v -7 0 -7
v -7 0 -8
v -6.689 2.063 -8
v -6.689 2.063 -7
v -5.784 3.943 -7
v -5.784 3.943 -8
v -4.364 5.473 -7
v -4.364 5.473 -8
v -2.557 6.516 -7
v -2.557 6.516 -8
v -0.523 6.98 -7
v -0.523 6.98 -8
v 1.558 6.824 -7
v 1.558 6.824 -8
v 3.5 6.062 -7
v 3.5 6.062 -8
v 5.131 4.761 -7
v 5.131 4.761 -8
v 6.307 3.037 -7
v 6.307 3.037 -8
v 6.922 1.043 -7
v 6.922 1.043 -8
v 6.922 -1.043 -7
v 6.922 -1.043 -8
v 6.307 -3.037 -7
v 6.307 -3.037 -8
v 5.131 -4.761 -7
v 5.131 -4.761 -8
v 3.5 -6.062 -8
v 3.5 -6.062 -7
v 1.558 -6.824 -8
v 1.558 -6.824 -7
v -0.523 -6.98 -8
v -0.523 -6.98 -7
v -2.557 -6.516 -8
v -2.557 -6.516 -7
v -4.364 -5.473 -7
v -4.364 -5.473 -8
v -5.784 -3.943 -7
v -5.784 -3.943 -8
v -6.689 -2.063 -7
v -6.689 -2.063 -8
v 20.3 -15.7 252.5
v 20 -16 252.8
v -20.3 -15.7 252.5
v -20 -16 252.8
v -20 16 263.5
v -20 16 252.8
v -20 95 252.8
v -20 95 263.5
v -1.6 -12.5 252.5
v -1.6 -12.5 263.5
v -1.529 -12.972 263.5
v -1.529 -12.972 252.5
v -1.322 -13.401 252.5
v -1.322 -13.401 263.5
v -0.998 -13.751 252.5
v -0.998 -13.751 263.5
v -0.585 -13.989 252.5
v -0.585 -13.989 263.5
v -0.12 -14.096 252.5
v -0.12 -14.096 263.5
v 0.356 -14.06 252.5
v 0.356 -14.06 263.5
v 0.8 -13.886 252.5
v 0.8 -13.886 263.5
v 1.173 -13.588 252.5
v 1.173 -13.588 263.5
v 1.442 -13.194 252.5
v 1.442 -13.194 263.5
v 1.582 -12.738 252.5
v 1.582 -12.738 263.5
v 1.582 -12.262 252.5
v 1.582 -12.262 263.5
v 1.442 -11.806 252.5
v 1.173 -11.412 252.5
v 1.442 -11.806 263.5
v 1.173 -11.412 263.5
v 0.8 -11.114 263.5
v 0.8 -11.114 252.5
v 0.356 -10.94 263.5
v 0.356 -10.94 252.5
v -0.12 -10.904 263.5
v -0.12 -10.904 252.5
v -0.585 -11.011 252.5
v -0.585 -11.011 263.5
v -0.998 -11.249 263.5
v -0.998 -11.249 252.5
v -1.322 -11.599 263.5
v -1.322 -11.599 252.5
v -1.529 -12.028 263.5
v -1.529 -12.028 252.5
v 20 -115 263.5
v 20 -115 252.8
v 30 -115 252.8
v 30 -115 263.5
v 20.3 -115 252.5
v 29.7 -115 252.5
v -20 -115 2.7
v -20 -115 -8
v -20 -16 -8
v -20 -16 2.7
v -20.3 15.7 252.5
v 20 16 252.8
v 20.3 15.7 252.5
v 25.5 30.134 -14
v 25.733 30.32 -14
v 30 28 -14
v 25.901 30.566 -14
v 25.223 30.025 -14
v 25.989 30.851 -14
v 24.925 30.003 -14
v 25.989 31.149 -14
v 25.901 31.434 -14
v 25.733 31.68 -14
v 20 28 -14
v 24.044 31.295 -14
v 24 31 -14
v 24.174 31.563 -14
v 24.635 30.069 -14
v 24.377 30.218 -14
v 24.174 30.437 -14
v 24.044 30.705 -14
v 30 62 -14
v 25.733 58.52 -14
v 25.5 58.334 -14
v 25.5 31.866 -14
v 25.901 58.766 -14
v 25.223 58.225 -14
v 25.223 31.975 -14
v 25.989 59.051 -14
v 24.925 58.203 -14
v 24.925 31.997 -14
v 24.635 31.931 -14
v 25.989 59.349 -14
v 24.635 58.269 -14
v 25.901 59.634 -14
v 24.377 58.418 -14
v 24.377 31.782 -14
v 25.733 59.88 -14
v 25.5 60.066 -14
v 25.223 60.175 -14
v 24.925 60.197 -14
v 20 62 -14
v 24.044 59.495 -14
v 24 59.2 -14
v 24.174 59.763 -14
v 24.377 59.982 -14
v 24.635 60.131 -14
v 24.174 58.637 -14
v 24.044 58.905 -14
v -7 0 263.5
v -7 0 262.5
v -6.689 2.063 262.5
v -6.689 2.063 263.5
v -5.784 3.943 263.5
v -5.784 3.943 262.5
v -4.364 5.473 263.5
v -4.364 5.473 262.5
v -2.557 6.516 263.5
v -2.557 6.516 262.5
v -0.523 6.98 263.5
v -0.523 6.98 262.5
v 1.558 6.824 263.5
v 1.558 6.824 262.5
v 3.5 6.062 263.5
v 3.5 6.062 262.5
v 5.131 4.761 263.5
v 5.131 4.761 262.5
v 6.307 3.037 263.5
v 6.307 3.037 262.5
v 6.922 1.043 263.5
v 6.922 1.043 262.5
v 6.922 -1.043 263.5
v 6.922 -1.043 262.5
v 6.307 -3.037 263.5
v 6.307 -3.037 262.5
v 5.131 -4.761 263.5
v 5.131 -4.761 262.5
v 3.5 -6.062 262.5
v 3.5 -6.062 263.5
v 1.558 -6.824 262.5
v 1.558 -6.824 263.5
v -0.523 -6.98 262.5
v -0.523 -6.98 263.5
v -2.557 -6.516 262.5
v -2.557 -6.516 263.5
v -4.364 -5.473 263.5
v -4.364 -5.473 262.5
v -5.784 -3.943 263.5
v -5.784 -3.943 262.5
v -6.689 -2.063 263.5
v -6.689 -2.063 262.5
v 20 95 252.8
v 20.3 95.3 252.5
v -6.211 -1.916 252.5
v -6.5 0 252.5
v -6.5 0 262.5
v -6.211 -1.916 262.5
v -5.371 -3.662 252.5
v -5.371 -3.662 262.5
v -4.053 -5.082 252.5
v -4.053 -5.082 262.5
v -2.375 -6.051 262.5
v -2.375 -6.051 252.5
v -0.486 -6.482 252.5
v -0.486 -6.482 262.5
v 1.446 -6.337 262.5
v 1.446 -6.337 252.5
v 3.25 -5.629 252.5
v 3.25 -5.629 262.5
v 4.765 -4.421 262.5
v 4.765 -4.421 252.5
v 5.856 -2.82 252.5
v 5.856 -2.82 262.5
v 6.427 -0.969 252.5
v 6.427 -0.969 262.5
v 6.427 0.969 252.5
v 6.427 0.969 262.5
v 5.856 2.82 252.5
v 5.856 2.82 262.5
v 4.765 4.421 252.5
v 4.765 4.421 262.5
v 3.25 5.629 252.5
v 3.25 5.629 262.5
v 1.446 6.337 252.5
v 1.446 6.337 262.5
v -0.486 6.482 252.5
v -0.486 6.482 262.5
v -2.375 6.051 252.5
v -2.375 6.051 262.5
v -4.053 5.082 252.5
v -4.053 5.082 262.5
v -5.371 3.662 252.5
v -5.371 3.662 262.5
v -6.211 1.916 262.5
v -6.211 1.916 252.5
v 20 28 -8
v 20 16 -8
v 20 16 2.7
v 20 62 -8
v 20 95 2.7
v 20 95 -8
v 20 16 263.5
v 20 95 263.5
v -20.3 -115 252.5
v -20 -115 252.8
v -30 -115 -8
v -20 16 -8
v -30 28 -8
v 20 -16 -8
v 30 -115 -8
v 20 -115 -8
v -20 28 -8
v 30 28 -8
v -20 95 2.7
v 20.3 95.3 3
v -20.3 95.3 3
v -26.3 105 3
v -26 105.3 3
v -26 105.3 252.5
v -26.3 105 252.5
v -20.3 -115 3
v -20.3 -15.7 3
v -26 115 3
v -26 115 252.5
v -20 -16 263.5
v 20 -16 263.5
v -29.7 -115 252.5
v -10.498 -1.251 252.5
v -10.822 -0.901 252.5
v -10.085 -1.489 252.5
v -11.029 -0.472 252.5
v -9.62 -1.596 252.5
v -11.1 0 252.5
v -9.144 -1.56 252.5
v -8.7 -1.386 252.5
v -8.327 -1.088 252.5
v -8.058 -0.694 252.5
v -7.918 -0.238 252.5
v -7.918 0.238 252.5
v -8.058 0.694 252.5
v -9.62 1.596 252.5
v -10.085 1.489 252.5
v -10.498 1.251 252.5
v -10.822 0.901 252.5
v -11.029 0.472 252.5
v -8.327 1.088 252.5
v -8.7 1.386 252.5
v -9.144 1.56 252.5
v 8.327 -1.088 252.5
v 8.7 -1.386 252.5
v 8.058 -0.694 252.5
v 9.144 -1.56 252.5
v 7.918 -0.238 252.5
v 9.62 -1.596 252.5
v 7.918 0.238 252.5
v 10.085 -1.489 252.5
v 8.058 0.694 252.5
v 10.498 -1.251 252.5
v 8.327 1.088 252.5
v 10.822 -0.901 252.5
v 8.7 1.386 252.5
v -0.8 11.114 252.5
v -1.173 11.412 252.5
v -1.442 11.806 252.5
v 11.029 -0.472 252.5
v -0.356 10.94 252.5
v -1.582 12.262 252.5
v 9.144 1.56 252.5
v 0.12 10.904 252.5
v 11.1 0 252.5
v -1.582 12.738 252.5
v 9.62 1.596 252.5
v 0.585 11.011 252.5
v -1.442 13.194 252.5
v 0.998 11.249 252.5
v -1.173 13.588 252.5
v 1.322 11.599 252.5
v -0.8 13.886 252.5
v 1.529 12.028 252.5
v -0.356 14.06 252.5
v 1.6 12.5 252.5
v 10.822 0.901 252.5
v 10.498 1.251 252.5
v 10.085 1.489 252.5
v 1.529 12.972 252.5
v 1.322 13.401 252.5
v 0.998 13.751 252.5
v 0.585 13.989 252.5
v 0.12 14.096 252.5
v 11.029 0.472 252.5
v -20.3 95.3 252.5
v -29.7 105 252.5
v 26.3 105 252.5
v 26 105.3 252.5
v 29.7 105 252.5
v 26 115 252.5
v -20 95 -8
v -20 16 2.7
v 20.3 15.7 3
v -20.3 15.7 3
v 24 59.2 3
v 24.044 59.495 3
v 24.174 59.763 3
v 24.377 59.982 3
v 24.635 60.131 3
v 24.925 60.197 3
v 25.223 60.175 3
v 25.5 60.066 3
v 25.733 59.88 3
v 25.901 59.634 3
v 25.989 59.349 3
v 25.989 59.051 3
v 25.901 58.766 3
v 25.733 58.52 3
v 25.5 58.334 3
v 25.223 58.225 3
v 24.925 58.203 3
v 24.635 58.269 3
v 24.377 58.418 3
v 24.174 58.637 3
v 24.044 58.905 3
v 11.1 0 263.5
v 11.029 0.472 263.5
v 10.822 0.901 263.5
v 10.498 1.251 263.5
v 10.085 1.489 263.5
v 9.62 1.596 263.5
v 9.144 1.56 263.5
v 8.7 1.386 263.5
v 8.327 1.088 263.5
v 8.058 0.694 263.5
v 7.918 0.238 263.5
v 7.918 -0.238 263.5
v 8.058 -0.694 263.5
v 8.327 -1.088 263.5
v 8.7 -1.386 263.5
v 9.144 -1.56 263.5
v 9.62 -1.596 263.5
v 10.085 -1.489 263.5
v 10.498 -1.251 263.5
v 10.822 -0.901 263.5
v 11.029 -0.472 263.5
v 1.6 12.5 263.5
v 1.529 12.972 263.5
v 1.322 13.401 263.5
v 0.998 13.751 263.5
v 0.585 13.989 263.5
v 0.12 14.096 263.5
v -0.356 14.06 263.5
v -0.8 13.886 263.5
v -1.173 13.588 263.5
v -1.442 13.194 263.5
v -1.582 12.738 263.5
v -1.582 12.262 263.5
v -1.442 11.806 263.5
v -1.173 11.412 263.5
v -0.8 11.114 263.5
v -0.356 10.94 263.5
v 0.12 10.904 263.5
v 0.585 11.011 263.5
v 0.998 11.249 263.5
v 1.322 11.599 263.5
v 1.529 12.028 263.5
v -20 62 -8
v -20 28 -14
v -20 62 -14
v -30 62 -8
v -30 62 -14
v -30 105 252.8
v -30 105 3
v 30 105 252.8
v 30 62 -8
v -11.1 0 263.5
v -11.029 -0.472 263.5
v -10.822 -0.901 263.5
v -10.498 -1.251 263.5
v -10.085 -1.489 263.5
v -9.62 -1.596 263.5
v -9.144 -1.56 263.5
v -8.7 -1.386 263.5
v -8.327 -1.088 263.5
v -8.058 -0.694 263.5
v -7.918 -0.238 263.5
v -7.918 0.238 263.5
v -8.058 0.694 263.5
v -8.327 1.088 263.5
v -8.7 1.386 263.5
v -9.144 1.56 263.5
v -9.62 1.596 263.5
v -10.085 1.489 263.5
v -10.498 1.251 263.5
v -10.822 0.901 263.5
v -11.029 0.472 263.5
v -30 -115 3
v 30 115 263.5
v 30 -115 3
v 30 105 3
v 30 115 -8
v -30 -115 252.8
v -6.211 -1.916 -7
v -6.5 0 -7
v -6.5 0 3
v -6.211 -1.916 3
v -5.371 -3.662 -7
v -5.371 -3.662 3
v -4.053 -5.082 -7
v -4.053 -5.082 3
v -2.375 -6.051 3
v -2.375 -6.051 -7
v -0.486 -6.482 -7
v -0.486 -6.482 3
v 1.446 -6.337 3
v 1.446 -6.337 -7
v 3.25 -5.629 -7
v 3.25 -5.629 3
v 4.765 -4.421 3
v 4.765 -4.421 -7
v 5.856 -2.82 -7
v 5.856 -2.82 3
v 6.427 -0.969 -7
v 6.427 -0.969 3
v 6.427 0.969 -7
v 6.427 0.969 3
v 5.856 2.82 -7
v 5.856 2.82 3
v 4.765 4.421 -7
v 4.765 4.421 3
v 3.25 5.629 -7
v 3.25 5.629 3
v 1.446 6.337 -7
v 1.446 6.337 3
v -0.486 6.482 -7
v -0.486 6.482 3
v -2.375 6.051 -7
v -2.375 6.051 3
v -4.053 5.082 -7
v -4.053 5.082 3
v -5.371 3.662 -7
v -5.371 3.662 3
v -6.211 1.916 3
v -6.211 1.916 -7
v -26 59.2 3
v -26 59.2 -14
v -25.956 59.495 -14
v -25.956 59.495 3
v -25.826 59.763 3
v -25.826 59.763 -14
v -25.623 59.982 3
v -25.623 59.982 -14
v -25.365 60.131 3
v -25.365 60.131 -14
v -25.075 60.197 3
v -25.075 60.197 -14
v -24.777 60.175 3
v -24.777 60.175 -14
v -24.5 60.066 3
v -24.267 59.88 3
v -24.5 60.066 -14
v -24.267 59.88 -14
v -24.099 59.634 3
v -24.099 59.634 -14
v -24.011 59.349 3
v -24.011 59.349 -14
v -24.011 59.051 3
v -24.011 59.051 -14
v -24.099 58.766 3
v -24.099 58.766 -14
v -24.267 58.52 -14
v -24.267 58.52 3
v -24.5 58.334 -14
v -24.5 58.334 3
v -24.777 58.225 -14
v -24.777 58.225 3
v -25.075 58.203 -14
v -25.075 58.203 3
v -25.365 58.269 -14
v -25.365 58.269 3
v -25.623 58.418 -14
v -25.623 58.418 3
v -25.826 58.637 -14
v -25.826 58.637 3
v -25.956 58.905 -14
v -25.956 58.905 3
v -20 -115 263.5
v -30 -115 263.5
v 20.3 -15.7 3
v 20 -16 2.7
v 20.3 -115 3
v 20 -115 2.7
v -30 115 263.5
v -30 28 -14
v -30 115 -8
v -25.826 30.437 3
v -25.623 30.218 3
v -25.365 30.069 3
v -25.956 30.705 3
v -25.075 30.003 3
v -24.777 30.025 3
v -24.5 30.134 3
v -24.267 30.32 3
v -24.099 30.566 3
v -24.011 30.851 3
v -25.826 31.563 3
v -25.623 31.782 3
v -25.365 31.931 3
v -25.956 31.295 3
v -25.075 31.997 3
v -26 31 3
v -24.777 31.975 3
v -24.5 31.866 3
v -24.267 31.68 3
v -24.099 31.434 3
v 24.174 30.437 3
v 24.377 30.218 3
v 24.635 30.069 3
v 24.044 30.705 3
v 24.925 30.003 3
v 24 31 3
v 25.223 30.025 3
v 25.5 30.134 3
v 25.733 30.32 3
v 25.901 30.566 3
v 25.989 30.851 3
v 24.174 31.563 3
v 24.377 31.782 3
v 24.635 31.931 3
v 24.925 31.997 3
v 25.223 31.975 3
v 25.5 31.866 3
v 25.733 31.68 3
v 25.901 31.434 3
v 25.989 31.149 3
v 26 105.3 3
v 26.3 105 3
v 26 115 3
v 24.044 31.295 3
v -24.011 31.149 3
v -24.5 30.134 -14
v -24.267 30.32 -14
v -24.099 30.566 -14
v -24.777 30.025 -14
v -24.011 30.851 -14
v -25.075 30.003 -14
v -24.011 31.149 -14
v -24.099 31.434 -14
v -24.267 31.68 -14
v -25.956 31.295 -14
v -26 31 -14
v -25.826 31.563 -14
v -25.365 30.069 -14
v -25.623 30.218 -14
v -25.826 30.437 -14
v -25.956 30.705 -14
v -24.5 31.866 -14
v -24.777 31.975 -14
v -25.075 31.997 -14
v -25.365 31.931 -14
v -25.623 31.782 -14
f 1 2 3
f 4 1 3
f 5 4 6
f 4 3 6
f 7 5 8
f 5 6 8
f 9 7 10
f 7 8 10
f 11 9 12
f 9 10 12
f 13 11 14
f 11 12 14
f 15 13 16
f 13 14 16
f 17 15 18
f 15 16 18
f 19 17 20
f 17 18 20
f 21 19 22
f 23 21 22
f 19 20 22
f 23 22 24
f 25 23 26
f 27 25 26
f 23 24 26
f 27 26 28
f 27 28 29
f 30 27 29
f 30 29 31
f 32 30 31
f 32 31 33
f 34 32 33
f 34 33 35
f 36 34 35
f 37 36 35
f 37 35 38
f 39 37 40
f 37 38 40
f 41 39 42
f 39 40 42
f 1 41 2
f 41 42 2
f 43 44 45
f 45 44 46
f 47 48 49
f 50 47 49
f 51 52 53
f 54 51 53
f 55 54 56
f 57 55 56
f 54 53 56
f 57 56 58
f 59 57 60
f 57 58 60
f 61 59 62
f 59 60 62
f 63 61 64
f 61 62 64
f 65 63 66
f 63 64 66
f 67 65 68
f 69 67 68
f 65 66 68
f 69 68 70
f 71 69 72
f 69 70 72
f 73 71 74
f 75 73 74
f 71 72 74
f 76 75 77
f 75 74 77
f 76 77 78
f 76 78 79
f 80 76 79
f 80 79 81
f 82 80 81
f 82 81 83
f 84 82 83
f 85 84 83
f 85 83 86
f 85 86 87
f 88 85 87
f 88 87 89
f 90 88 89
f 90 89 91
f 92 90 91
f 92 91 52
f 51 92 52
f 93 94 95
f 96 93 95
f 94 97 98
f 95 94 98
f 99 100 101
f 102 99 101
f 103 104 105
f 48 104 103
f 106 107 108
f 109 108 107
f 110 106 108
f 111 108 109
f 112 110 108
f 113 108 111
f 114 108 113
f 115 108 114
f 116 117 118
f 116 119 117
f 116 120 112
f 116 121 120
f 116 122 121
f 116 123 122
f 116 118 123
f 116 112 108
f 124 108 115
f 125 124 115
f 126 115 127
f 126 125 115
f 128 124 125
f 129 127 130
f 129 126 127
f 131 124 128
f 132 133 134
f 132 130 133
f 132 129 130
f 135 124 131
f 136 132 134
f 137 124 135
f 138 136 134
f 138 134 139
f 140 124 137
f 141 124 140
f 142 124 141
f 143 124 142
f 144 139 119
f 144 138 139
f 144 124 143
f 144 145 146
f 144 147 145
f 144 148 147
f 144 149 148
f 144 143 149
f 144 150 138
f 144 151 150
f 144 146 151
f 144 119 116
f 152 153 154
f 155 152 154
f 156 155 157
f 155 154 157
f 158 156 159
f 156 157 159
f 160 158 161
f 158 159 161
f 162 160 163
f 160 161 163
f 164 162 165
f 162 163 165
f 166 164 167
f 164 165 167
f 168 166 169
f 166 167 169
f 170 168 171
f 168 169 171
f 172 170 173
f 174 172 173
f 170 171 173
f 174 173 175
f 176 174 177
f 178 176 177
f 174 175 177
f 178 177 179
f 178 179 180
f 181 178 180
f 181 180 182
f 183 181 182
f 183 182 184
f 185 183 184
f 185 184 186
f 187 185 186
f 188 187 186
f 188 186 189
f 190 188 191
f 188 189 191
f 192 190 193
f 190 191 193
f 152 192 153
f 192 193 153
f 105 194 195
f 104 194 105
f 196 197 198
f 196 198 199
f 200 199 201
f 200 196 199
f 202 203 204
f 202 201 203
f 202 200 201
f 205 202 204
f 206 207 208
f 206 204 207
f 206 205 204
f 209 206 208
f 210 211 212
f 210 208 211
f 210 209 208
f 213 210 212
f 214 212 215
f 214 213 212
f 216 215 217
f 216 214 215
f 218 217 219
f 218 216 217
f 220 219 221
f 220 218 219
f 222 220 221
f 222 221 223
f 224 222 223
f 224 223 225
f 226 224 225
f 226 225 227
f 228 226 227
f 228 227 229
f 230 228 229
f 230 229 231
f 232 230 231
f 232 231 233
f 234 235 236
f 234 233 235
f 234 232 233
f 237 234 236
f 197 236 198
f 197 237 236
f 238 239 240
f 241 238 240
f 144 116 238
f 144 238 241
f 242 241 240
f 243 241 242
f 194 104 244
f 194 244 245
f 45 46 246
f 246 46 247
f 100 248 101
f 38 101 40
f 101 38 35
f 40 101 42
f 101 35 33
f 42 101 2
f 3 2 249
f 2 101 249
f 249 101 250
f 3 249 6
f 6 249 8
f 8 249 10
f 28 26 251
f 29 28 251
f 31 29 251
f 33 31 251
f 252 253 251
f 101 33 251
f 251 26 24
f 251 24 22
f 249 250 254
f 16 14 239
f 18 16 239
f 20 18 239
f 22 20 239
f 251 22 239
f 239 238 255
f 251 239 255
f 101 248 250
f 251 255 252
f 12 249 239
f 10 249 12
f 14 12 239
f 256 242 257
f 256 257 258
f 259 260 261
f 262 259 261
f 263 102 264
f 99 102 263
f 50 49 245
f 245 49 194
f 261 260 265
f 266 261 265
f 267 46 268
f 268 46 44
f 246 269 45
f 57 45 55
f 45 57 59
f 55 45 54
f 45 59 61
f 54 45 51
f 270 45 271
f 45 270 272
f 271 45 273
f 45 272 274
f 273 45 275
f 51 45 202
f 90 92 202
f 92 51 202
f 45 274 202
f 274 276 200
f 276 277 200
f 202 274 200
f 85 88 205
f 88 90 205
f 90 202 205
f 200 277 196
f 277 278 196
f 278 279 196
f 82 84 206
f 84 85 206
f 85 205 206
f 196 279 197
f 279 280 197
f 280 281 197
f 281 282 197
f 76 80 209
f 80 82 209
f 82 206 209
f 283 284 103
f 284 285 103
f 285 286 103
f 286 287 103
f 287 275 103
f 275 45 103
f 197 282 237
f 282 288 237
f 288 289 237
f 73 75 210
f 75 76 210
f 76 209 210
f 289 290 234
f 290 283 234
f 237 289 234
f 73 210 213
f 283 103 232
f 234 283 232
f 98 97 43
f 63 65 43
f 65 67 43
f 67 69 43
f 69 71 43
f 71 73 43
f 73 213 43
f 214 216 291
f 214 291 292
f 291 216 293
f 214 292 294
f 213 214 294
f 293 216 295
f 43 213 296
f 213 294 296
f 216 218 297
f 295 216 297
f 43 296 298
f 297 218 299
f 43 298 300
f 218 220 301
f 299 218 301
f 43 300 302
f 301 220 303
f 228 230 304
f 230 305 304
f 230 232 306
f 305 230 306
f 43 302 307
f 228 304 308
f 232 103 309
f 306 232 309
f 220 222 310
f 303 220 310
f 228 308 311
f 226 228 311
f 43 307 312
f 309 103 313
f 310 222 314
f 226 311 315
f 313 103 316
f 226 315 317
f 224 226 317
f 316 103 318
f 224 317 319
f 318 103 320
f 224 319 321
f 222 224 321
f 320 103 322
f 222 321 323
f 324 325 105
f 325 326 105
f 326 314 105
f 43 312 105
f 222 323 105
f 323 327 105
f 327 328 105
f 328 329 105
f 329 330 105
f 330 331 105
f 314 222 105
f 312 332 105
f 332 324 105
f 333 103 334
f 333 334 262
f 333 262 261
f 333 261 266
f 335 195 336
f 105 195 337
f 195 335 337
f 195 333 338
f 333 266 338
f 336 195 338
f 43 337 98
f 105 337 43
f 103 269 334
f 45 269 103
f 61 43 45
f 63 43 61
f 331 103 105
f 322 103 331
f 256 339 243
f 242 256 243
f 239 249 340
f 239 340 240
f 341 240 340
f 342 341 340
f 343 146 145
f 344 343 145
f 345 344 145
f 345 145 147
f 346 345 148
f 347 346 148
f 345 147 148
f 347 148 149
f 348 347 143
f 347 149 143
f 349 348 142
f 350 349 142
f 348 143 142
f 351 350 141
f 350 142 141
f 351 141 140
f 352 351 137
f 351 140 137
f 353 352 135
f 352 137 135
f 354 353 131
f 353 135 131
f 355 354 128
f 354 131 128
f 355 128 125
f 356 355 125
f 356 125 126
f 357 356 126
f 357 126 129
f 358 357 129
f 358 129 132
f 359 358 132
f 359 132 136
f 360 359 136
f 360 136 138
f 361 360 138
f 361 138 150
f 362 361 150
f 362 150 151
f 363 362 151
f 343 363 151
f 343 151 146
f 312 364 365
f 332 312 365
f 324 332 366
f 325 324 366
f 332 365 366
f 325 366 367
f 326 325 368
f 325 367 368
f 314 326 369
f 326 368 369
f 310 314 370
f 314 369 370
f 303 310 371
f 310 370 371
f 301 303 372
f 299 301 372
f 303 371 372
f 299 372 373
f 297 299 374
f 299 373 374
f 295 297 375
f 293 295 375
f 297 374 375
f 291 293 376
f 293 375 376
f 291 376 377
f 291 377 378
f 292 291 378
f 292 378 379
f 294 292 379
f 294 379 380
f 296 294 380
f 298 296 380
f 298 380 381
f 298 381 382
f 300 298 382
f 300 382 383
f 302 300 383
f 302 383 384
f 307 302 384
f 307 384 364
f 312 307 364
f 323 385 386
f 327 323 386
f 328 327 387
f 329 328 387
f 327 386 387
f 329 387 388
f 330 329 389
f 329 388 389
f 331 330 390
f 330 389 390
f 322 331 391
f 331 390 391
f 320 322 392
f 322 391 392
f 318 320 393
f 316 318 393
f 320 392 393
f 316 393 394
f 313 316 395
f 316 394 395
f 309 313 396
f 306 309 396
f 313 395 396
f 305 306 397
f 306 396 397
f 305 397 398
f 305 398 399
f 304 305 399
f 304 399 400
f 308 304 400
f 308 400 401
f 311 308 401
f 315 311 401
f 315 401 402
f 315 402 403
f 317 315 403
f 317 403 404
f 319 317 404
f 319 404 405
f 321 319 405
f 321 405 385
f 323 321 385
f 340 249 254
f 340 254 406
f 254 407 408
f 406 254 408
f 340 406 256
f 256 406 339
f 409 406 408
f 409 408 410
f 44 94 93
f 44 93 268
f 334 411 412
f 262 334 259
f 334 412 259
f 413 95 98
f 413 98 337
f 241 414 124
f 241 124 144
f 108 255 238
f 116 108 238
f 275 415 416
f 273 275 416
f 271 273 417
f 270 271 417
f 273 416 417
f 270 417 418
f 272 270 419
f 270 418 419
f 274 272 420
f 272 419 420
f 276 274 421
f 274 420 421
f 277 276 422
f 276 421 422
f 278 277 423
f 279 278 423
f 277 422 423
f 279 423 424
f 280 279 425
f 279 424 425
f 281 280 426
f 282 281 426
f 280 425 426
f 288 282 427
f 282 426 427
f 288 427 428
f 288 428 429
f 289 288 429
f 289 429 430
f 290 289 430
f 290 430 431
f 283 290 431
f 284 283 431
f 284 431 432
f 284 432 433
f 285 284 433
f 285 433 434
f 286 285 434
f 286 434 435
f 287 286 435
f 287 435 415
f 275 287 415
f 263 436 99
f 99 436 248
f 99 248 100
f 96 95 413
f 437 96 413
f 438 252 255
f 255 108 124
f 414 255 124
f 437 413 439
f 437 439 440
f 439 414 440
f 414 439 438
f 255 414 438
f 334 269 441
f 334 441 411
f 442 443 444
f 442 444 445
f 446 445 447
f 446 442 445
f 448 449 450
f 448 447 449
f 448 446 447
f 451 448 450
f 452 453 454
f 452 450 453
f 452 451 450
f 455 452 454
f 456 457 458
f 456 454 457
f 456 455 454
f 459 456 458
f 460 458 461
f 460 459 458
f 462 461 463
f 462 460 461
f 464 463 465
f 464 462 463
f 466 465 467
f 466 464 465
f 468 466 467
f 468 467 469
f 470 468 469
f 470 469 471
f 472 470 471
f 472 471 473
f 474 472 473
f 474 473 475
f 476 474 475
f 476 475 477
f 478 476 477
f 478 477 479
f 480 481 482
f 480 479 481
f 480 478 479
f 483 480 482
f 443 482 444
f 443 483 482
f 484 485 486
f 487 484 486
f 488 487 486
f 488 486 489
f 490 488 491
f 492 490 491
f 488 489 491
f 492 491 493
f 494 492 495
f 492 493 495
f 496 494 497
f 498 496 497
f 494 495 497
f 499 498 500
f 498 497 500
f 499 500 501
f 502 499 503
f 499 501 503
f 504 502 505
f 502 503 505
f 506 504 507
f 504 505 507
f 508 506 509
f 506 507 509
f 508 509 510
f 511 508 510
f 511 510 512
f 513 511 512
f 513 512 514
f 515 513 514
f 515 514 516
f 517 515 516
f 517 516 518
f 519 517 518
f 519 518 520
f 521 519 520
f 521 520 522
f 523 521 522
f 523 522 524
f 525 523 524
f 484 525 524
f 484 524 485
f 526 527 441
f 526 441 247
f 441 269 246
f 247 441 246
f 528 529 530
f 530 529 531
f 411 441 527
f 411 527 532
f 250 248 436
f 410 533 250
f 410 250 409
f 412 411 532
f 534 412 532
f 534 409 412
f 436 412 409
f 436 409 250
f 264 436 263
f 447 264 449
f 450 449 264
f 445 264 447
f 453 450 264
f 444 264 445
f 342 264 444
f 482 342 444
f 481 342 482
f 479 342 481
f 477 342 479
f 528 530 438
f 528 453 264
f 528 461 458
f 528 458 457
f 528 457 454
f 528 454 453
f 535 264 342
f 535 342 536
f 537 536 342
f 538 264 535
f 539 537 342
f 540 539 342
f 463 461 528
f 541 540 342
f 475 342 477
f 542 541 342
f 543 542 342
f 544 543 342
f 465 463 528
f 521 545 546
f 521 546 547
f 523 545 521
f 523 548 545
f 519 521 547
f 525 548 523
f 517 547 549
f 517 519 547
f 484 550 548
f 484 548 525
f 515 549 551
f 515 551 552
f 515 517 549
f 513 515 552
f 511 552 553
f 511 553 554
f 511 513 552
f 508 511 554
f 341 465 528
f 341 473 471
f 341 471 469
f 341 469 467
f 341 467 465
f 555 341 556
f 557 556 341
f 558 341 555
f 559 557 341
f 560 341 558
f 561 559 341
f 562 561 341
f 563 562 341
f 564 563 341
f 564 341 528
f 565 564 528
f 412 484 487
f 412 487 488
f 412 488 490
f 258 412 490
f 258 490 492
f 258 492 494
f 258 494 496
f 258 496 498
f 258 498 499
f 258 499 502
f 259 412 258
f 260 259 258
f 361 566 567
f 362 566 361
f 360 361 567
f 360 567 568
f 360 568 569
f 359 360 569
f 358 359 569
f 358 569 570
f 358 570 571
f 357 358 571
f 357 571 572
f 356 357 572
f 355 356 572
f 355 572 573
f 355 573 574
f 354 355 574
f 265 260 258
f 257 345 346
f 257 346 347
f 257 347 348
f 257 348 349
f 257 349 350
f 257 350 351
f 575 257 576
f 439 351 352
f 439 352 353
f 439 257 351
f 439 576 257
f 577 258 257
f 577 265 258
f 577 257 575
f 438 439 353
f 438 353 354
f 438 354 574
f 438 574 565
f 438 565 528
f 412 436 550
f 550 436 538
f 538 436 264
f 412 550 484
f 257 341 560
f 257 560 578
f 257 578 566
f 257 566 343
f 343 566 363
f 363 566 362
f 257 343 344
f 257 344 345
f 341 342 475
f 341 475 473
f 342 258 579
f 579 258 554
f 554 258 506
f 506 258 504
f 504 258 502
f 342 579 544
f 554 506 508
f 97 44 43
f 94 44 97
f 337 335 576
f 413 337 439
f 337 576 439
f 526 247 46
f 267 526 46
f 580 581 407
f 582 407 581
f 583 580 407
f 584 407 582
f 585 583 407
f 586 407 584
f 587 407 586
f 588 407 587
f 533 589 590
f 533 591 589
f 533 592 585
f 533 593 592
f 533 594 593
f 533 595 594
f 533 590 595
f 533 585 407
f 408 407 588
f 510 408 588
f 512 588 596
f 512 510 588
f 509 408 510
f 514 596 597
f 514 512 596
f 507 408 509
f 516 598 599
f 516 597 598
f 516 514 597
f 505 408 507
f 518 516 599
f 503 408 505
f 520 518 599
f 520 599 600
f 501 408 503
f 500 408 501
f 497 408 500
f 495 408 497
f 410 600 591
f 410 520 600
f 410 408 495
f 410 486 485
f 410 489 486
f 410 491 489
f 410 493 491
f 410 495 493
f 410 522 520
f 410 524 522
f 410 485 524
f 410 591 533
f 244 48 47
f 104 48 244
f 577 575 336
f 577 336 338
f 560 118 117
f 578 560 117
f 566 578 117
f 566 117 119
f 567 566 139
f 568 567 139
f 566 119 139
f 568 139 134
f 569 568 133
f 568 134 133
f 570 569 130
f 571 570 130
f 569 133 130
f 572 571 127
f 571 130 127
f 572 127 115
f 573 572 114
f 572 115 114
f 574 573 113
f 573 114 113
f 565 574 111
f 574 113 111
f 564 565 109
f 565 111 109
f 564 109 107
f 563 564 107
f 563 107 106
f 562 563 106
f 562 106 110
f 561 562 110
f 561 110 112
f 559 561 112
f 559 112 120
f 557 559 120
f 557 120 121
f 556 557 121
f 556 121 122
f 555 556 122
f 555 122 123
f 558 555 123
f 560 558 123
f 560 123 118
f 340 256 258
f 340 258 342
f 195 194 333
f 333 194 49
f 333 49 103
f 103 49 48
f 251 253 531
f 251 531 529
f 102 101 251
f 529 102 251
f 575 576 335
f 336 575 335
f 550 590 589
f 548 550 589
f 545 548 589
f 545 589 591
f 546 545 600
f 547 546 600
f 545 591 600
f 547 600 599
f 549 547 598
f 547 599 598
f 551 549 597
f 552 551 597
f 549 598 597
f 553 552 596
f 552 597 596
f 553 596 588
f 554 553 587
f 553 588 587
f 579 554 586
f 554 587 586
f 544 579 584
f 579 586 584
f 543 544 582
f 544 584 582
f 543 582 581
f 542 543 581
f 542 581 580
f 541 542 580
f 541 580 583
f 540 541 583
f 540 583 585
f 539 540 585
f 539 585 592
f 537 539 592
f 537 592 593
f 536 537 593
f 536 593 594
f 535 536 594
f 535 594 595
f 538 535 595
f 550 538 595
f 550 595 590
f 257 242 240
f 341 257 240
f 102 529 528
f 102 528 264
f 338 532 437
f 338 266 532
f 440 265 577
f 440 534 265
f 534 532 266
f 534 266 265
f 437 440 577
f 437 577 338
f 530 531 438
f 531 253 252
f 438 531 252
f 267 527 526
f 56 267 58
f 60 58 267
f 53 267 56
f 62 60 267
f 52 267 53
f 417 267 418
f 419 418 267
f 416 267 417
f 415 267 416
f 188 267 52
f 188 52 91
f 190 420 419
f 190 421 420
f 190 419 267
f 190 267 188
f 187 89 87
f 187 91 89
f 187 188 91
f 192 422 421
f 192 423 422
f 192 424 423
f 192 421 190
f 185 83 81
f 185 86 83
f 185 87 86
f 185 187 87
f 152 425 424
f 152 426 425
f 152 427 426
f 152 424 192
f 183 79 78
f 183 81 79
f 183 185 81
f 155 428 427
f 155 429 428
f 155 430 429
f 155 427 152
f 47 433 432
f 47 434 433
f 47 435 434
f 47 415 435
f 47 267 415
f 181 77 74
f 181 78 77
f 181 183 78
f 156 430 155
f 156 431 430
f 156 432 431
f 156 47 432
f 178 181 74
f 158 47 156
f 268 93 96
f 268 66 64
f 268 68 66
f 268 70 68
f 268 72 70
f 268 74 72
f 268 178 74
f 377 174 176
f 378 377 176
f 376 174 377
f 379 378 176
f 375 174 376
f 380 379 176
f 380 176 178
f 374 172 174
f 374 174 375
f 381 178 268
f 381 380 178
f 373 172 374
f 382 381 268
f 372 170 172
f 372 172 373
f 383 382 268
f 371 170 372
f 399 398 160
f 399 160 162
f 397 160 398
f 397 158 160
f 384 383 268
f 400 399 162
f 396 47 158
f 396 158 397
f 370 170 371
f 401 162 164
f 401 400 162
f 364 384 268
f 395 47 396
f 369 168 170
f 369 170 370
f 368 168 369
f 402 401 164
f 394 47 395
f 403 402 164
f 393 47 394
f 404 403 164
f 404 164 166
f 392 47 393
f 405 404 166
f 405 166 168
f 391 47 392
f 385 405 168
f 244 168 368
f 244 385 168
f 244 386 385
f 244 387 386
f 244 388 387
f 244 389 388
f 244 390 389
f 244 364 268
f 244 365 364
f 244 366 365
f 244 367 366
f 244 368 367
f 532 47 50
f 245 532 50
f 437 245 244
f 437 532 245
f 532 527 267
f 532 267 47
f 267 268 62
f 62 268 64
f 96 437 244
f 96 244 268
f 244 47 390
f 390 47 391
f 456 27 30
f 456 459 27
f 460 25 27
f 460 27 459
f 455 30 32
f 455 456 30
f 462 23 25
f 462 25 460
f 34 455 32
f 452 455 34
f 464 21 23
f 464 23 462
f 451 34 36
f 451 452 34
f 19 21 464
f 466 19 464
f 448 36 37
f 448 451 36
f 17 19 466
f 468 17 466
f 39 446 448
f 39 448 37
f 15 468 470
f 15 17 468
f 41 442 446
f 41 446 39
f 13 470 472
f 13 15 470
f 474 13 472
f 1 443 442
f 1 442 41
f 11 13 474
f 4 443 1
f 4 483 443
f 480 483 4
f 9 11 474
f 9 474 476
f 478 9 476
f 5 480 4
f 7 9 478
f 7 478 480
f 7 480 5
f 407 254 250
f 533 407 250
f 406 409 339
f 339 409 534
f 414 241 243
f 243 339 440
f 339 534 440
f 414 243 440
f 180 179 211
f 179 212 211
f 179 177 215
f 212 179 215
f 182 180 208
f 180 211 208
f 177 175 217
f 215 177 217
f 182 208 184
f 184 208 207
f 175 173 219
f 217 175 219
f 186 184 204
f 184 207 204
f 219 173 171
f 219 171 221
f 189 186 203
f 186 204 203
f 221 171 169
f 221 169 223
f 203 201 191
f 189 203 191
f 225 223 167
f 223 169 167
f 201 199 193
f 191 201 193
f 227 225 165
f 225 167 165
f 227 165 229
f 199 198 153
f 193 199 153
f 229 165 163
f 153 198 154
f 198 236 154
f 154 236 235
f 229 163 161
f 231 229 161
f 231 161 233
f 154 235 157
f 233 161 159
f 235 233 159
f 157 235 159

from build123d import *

# Parameters (mm, degrees)
BOSS_EXTRUDE1_START      = -8
SKETCH1_W                = 60
SKETCH1_H                = 230
BOSS_EXTRUDE1_DEPTH      = 11
CUT_EXTRUDE1_DEPTH       = 120.117588961
CUT_EXTRUDE1_DEPTH_BACK  = 120.117588961
SKETCH2_W                = 40
SKETCH2_H                = 99
CUT_EXTRUDE2_DEPTH       = 120.117588961
CUT_EXTRUDE2_DEPTH_BACK  = 120.117588961
SKETCH3_W                = 40
SKETCH3_H                = 79
SKETCH4_W                = 60
SKETCH4_H                = 230
BOSS_EXTRUDE3_DEPTH      = 11
CUT_EXTRUDE3_DEPTH       = 297.373497466
CUT_EXTRUDE3_DEPTH_BACK  = 297.373497466
SKETCH6_W                = 40
SKETCH6_H                = 79
CUT_EXTRUDE4_DEPTH       = 287.33066549
CUT_EXTRUDE4_DEPTH_BACK  = 287.33066549
SKETCH7_W                = 40
SKETCH7_H                = 99
SKETCH8_W                = 4
SKETCH8_H                = 10
BOSS_EXTRUDE4_DEPTH      = 249.5
CUT_EXTRUDE13_DEPTH      = 287.33066549
CUT_EXTRUDE13_DEPTH_BACK = 287.33066549
SKETCH9_R                = 6.5
CUT_EXTRUDE15_START      = -10
SKETCH13_R               = 7
CUT_EXTRUDE15_DEPTH      = 1
SKETCH14_R               = 7
CUT_EXTRUDE16_DEPTH      = 1
CUT_EXTRUDE17_REACH      = 298.373
SKETCH15_R               = 1.6
SKETCH17_W               = 10
SKETCH17_H               = 34
BOSS_EXTRUDE5_DEPTH      = 6
CUT_EXTRUDE18_REACH      = 303.88
SKETCH18_R               = 1
CHAMFER1_SIZE            = 0.3
CHAMFER2_SIZE            = 0.3
CHAMFER3_SIZE            = 0.3
CHAMFER4_SIZE            = 0.3
CHAMFER5_SIZE            = 0.3


with BuildPart() as part:
    # Sketch1 → Boss-Extrude1 (new body)
    with BuildSketch(Plane.XY.offset(BOSS_EXTRUDE1_START)):
        Rectangle(SKETCH1_W, SKETCH1_H)
    extrude(amount=BOSS_EXTRUDE1_DEPTH)

    # Sketch2 → Cut-Extrude1 (cut, two sides: drawn at the far end of the back side and taken through both)
    with BuildSketch(Plane.XY.offset(-CUT_EXTRUDE1_DEPTH_BACK)):
        with Locations((0, -65.5)):
            Rectangle(SKETCH2_W, SKETCH2_H)
    extrude(amount=CUT_EXTRUDE1_DEPTH + CUT_EXTRUDE1_DEPTH_BACK, mode=Mode.SUBTRACT)

    # Sketch3 → Cut-Extrude2 (cut, two sides: drawn at the far end of the back side and taken through both)
    with BuildSketch(Plane.XY.offset(-CUT_EXTRUDE2_DEPTH_BACK)):
        with Locations((0, 55.5)):
            Rectangle(SKETCH3_W, SKETCH3_H)
    extrude(amount=CUT_EXTRUDE2_DEPTH + CUT_EXTRUDE2_DEPTH_BACK, mode=Mode.SUBTRACT)



with BuildPart() as body_2:
    # Sketch4 → Boss-Extrude3 (new body)
    with BuildSketch(Plane.XY.offset(252.5)):
        Rectangle(SKETCH4_W, SKETCH4_H)
    extrude(amount=BOSS_EXTRUDE3_DEPTH)

    # Sketch6 → Cut-Extrude3 (cut, two sides: drawn at the far end of the back side and taken through both)
    with BuildSketch(Plane.XY.offset(263.5).offset(-CUT_EXTRUDE3_DEPTH_BACK)):
        with Locations((0, 55.5)):
            Rectangle(SKETCH6_W, SKETCH6_H)
    extrude(amount=CUT_EXTRUDE3_DEPTH + CUT_EXTRUDE3_DEPTH_BACK, mode=Mode.SUBTRACT)

    # Sketch7 → Cut-Extrude4 (cut, two sides: drawn at the far end of the back side and taken through both)
    with BuildSketch(Plane.XY.offset(252.5).offset(-CUT_EXTRUDE4_DEPTH_BACK)):
        with Locations((0, -65.5)):
            Rectangle(SKETCH7_W, SKETCH7_H)
    extrude(amount=CUT_EXTRUDE4_DEPTH + CUT_EXTRUDE4_DEPTH_BACK, mode=Mode.SUBTRACT)


with BuildPart() as part_1:
    add(part.part)

    add(body_2.part)  # Boss-Extrude4 merges body 2
    # Sketch8 → Boss-Extrude4 (add)
    with BuildSketch(Plane.XY.offset(3)):
        with Locations((-28, 110)):
            Rectangle(SKETCH8_W, SKETCH8_H)
        with Locations((28, 110)):
            Rectangle(SKETCH8_W, SKETCH8_H)
    extrude(amount=BOSS_EXTRUDE4_DEPTH)

    # Sketch9 → Cut-Extrude13 (cut, two sides: drawn at the far end of the back side and taken through both)
    with BuildSketch(Plane.XY.offset(252.5).offset(-CUT_EXTRUDE13_DEPTH_BACK)):
        with Locations(Location((0, 0, 0), (0, 0, 180))):
            Circle(SKETCH9_R)
    extrude(amount=CUT_EXTRUDE13_DEPTH + CUT_EXTRUDE13_DEPTH_BACK, mode=Mode.SUBTRACT)

    # Sketch13 → Cut-Extrude15 (cut)
    with BuildSketch(Plane(origin=(0, 0, 252.5), x_dir=(-1, 0, 0), z_dir=(0, 0, -1)).offset(CUT_EXTRUDE15_START)):
        Circle(SKETCH13_R)
    extrude(amount=-CUT_EXTRUDE15_DEPTH, mode=Mode.SUBTRACT)

    # Sketch14 → Cut-Extrude16 (cut)
    with BuildSketch(Plane(origin=(0, 0, -8), x_dir=(-1, 0, 0), z_dir=(0, 0, -1))):
        Circle(SKETCH14_R)
    extrude(amount=-CUT_EXTRUDE16_DEPTH, mode=Mode.SUBTRACT)

    # Sketch15 → Cut-Extrude17 (cut, up to next)
    with BuildSketch(Plane.XY.offset(263.5), mode=Mode.PRIVATE) as cut_extrude17_sk1:
        with Locations((9.5, 0)):
            Circle(SKETCH15_R)
    cut_extrude17_tool1 = extrude(cut_extrude17_sk1.sketch, amount=-CUT_EXTRUDE17_REACH, mode=Mode.PRIVATE) & part_1.part
    # Sketch15 → Cut-Extrude17 (cut, up to next)
    with BuildSketch(Plane.XY.offset(263.5), mode=Mode.PRIVATE) as cut_extrude17_sk2:
        with Locations(Location((-9.5, 0, 0), (0, 0, 180))):
            Circle(SKETCH15_R)
    cut_extrude17_tool2 = extrude(cut_extrude17_sk2.sketch, amount=-CUT_EXTRUDE17_REACH, mode=Mode.PRIVATE) & part_1.part
    # Sketch15 → Cut-Extrude17 (cut, up to next)
    with BuildSketch(Plane.XY.offset(263.5), mode=Mode.PRIVATE) as cut_extrude17_sk3:
        with Locations((0, 12.5)):
            Circle(SKETCH15_R)
    cut_extrude17_tool3 = extrude(cut_extrude17_sk3.sketch, amount=-CUT_EXTRUDE17_REACH, mode=Mode.PRIVATE) & part_1.part
    # Sketch15 → Cut-Extrude17 (cut, up to next)
    with BuildSketch(Plane.XY.offset(263.5), mode=Mode.PRIVATE) as cut_extrude17_sk4:
        with Locations(Location((0, -12.5, 0), (0, 0, 180))):
            Circle(SKETCH15_R)
    cut_extrude17_tool4 = extrude(cut_extrude17_sk4.sketch, amount=-CUT_EXTRUDE17_REACH, mode=Mode.PRIVATE) & part_1.part
    add(cut_extrude17_tool1.solids().sort_by_distance((9.5, 0, 263.5))[0], mode=Mode.SUBTRACT)
    add(cut_extrude17_tool2.solids().sort_by_distance((-9.5, 0, 263.5))[0], mode=Mode.SUBTRACT)
    add(cut_extrude17_tool3.solids().sort_by_distance((0, 12.5, 263.5))[0], mode=Mode.SUBTRACT)
    add(cut_extrude17_tool4.solids().sort_by_distance((0, -12.5, 263.5))[0], mode=Mode.SUBTRACT)

    # Sketch17 → Boss-Extrude5 (add)
    with BuildSketch(Plane(origin=(0, 0, -8), x_dir=(-1, 0, 0), z_dir=(0, 0, -1))):
        with Locations((25, 45)):
            Rectangle(SKETCH17_W, SKETCH17_H)
        with Locations((-25, 45)):
            Rectangle(SKETCH17_W, SKETCH17_H)
    extrude(amount=BOSS_EXTRUDE5_DEPTH)

    # Sketch18 → Cut-Extrude18 (cut, up to next)
    with BuildSketch(Plane(origin=(0, 0, -14), x_dir=(-1, 0, 0), z_dir=(0, 0, -1)), mode=Mode.PRIVATE) as cut_extrude18_sk1:
        with Locations((-25, 59.2)):
            Circle(SKETCH18_R)
    cut_extrude18_tool1 = extrude(cut_extrude18_sk1.sketch, amount=-CUT_EXTRUDE18_REACH, mode=Mode.PRIVATE) & part_1.part
    # Sketch18 → Cut-Extrude18 (cut, up to next)
    with BuildSketch(Plane(origin=(0, 0, -14), x_dir=(-1, 0, 0), z_dir=(0, 0, -1)), mode=Mode.PRIVATE) as cut_extrude18_sk2:
        with Locations((-25, 31)):
            Circle(SKETCH18_R)
    cut_extrude18_tool2 = extrude(cut_extrude18_sk2.sketch, amount=-CUT_EXTRUDE18_REACH, mode=Mode.PRIVATE) & part_1.part
    # Sketch18 → Cut-Extrude18 (cut, up to next)
    with BuildSketch(Plane(origin=(0, 0, -14), x_dir=(-1, 0, 0), z_dir=(0, 0, -1)), mode=Mode.PRIVATE) as cut_extrude18_sk3:
        with Locations((25, 59.2)):
            Circle(SKETCH18_R)
    cut_extrude18_tool3 = extrude(cut_extrude18_sk3.sketch, amount=-CUT_EXTRUDE18_REACH, mode=Mode.PRIVATE) & part_1.part
    # Sketch18 → Cut-Extrude18 (cut, up to next)
    with BuildSketch(Plane(origin=(0, 0, -14), x_dir=(-1, 0, 0), z_dir=(0, 0, -1)), mode=Mode.PRIVATE) as cut_extrude18_sk4:
        with Locations((25, 31)):
            Circle(SKETCH18_R)
    cut_extrude18_tool4 = extrude(cut_extrude18_sk4.sketch, amount=-CUT_EXTRUDE18_REACH, mode=Mode.PRIVATE) & part_1.part
    add(cut_extrude18_tool1.solids().sort_by_distance((25, 59.2, -14))[0], mode=Mode.SUBTRACT)
    add(cut_extrude18_tool2.solids().sort_by_distance((25, 31, -14))[0], mode=Mode.SUBTRACT)
    add(cut_extrude18_tool3.solids().sort_by_distance((-25, 59.2, -14))[0], mode=Mode.SUBTRACT)
    add(cut_extrude18_tool4.solids().sort_by_distance((-25, 31, -14))[0], mode=Mode.SUBTRACT)

    # Chamfer1
    chamfer1_edges = [part_1.edges().sort_by_distance(p)[0] for p in [
        (-30, -5, 252.5),
    ]]
    chamfer(chamfer1_edges, length=CHAMFER1_SIZE)

    # Chamfer2
    chamfer2_edges = [part_1.edges().sort_by_distance(p)[0] for p in [
        (30, -5, 252.5),
    ]]
    chamfer(chamfer2_edges, length=CHAMFER2_SIZE)

    # Chamfer3
    chamfer3_edges = [part_1.edges().sort_by_distance(p)[0] for p in [
        (-26, 105, 127.75),
        (26, 105, 127.75),
    ]]
    chamfer(chamfer3_edges, length=CHAMFER3_SIZE)

    # Chamfer4
    chamfer4_edges = [part_1.edges().sort_by_distance(p)[0] for p in [
        (-20, -65.5, 3),
        (20, -65.5, 3),
        (0, -16, 3),
        (20, 55.5, 3),
        (0, 95, 3),
        (-20, 55.5, 3),
        (0, 16, 3),
    ]]
    chamfer(chamfer4_edges, length=CHAMFER4_SIZE)

    # Chamfer5
    chamfer5_edges = [part_1.edges().sort_by_distance(p)[0] for p in [
        (20, -65.5, 252.5),
        (0, -16, 252.5),
        (-20, -65.5, 252.5),
        (20, 55.5, 252.5),
        (0, 16, 252.5),
        (-20, 55.5, 252.5),
        (0, 95, 252.5),
    ]]
    chamfer(chamfer5_edges, length=CHAMFER5_SIZE)


solid = part_1.part
